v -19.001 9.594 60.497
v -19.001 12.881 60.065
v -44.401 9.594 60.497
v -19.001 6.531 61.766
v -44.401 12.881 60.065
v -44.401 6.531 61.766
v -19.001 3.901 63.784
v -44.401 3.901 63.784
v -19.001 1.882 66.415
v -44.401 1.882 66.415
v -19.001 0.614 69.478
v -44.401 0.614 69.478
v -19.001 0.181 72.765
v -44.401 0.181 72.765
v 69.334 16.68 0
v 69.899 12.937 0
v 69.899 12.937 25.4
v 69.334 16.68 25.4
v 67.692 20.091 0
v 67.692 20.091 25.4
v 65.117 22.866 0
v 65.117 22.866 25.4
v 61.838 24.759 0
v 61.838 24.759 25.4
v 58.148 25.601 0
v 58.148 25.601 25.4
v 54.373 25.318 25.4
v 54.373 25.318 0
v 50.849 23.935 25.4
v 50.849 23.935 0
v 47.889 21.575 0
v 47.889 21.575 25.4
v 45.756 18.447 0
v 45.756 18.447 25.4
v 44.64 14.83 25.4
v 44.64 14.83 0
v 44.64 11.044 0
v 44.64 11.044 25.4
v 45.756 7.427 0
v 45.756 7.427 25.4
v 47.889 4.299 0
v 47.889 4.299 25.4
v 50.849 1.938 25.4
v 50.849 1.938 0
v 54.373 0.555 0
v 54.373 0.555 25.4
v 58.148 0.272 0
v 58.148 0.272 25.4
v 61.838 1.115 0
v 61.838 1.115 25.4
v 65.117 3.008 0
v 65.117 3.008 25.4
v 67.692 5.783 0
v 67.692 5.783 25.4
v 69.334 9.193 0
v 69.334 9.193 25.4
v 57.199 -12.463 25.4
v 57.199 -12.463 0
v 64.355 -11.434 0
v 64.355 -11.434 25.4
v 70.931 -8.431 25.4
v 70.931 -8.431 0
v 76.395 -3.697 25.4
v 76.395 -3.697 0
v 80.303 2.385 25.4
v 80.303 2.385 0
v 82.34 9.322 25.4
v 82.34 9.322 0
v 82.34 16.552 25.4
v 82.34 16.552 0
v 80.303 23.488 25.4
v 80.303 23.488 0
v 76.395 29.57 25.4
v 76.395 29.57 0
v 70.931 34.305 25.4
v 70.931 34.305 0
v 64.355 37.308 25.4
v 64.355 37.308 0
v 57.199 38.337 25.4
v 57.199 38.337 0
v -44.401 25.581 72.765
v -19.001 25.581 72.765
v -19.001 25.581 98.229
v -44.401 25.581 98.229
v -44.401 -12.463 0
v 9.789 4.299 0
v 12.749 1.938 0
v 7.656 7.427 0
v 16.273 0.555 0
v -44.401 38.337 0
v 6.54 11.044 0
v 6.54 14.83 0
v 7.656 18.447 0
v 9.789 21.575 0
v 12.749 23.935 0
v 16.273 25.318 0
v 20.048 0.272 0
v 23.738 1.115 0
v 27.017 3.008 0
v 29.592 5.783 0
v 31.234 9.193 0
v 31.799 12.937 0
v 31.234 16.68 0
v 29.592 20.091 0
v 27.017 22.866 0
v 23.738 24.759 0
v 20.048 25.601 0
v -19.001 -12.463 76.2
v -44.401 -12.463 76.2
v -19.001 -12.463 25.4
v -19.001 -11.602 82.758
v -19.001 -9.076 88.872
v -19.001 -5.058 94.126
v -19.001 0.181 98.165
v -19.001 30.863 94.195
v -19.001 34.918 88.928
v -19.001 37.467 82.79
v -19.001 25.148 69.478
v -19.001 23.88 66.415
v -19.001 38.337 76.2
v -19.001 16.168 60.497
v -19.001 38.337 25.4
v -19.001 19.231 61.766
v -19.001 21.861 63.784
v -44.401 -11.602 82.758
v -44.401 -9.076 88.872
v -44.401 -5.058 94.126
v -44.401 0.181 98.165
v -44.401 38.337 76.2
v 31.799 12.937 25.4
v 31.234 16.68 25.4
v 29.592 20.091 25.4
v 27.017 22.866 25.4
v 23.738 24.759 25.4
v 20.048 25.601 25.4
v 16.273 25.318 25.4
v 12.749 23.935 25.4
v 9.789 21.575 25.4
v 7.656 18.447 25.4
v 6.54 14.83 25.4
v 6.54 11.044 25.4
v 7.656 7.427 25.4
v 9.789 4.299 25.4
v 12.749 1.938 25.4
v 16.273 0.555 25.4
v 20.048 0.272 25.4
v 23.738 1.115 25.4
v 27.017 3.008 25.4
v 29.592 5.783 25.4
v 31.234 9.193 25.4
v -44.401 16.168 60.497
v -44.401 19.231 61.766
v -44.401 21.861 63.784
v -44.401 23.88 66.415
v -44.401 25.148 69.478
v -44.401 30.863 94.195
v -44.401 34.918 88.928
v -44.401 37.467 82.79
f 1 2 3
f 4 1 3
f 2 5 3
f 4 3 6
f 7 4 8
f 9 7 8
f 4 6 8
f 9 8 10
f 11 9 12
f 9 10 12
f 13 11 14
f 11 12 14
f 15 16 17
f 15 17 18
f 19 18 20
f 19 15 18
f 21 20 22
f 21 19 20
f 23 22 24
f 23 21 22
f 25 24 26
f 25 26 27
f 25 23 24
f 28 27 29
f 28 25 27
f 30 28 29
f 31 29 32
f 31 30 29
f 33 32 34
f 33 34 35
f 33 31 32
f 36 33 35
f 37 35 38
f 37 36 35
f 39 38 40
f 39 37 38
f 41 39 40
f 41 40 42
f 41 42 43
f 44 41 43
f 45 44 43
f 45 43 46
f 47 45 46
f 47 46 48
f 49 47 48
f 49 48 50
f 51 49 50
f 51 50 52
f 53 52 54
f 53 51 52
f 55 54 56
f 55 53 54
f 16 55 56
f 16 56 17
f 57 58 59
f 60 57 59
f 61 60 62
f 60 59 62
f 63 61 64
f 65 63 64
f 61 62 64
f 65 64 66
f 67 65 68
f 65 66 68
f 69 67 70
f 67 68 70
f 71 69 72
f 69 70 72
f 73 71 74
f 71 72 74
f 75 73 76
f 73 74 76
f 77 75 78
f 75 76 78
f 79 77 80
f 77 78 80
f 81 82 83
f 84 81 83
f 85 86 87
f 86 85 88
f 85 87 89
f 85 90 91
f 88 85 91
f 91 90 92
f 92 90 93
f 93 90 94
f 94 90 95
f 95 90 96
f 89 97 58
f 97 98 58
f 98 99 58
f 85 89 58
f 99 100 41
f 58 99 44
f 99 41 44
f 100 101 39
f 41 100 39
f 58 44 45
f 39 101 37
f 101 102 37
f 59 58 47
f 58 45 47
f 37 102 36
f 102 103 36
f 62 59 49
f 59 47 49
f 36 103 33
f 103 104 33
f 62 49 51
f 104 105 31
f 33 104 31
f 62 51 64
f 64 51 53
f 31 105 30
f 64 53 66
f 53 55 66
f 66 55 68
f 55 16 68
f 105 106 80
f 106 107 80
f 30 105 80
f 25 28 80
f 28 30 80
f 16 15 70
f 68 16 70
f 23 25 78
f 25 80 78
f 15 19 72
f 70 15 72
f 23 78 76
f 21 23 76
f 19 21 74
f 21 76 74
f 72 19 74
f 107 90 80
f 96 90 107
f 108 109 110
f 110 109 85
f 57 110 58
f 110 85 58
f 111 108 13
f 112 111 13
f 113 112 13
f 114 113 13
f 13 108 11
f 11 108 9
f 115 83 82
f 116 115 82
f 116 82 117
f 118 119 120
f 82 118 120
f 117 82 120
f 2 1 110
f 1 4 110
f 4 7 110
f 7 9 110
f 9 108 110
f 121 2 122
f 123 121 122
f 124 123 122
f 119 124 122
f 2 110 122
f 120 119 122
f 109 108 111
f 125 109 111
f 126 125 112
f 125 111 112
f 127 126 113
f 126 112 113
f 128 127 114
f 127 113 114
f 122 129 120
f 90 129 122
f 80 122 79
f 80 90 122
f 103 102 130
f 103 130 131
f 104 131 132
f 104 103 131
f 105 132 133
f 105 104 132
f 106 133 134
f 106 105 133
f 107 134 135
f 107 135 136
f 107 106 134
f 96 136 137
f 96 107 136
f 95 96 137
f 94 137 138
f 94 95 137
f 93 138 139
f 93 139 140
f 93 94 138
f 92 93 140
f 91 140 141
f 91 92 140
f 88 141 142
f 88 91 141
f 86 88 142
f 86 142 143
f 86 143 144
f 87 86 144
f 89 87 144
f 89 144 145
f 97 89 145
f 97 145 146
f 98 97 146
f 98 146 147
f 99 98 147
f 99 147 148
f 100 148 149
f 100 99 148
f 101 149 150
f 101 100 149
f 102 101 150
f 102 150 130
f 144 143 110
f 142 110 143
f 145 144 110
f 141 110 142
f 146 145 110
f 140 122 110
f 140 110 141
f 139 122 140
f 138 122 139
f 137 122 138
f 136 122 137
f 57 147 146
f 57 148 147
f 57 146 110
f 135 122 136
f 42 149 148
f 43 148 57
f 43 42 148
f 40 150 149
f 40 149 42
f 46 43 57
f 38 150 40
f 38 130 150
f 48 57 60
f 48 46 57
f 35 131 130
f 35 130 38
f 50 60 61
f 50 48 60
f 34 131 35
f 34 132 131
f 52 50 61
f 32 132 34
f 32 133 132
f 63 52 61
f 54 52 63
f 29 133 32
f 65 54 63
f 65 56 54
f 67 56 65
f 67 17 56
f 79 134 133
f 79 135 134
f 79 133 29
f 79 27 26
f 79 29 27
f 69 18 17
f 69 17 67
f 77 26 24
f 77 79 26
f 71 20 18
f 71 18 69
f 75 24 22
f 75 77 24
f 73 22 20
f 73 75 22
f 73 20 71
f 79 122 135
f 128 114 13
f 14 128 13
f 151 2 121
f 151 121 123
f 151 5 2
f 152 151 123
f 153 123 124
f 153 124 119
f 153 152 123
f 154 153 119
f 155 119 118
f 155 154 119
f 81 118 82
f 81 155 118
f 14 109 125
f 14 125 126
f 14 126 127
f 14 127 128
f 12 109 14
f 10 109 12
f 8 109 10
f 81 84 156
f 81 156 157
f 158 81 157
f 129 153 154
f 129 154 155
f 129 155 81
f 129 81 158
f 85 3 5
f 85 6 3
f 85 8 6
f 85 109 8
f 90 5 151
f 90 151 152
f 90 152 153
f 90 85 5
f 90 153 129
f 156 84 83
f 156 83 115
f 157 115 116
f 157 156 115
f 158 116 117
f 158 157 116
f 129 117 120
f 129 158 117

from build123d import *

# Parameters (mm, degrees)
F0_R        = 12.7
F1_DEPTH    = 25.4
F2_W        = 25.4
F2_H        = 50.8
F3_DEPTH    = 76.2
F4_R        = 25.4
F5_T1_DEPTH = 152.4
F7_DEPTH    = 25.401
F8_R        = 12.7
F9_R        = 12.69999


# Not quite as in the source:
# - a fillet or chamfer that OpenCascade refuses, or shapes differently, is made with other operations: its cross-section is extruded or revolved along the edge and cut away or added
# - a fillet or chamfer is up to 0.001 mm smaller than in the source, because OpenCascade refuses the exact size


with BuildPart() as f1:
    # F0 (on Top) → F1 (new body)
    with BuildSketch(Plane.XY):
        with BuildLine():
            Line((57.198610294, 38.3368320964), (-44.401389706, 38.3368320964))
            Line((-44.401389706, 38.3368320964), (-44.401389706, -12.4631679036))
            Line((-44.401389706, -12.4631679036), (57.198610294, -12.4631679036))
            ThreePointArc((57.198610294, -12.4631679036), (82.598610294, 12.9368320964), (57.198610294, 38.3368320964))
        make_face()
        with Locations((19.098610294, 12.9368320964)):
            Circle(F0_R, mode=Mode.SUBTRACT)
        with Locations((57.198610294, 12.9368320964)):
            Circle(F0_R, mode=Mode.SUBTRACT)
    extrude(amount=F1_DEPTH)

    # F2 (on face) → F3 (join)
    with BuildSketch(Plane.XY.offset(25.4)):
        with Locations((-31.701389706, 12.9368320964)):
            Rectangle(F2_W, F2_H)
    extrude(amount=F3_DEPTH)

    # F4
    f4_edges = [f1.edges().sort_by_distance(p)[0] for p in [
        (-31.70139, -12.463168, 101.6),
    ]]
    fillet(f4_edges, radius=F4_R)

    # F5: fillet of radius 25.4 on 1 edges, made by hand

    # F5_s2 → F5_t1 (cut)
    with BuildSketch(Plane.YZ.offset(-107.901389706)):
        with BuildLine():
            ThreePointArc((12.9368320964, 101.6), (30.8973443386, 94.1605122421), (38.3368320964, 76.2))
            Line((38.3368320964, 76.2), (38.3368320964, 101.6))
            Line((38.3368320964, 101.6), (12.9368320964, 101.6))
        make_face()
    extrude(amount=F5_T1_DEPTH, mode=Mode.SUBTRACT)

    # F6 (on face) → F7 (cut, through all)
    with BuildSketch(Plane.YZ.offset(-19.001389706)):
        with BuildLine():
            ThreePointArc((12.9368320964, 101.6), (6.3316674028, 100.7261452204), (0.1809873343, 98.1647086118))
            Line((0.1809873343, 98.1647086118), (0.1809873343, 60.0647086118))
            Line((0.1809873343, 60.0647086118), (25.5809873343, 60.0647086118))
            Line((25.5809873343, 60.0647086118), (25.5809873343, 98.2291928659))
            ThreePointArc((25.5809873343, 98.2291928659), (19.4797099497, 100.742834991), (12.9368320964, 101.6))
        make_face()
    extrude(amount=-F7_DEPTH, mode=Mode.SUBTRACT)

    # F8
    f8_edges = [f1.edges().sort_by_distance(p)[0] for p in [
        (-31.70139, 0.180987, 60.064709),
    ]]
    fillet(f8_edges, radius=F8_R)

    # F9 (radius 12.7 in the source; OpenCascade refuses exactly that, so slightly less here)
    f9_edges = [f1.edges().sort_by_distance(p)[0] for p in [
        (-31.70139, 25.580987, 60.064709),
    ]]
    fillet(f9_edges, radius=F9_R)


solid = f1.part
